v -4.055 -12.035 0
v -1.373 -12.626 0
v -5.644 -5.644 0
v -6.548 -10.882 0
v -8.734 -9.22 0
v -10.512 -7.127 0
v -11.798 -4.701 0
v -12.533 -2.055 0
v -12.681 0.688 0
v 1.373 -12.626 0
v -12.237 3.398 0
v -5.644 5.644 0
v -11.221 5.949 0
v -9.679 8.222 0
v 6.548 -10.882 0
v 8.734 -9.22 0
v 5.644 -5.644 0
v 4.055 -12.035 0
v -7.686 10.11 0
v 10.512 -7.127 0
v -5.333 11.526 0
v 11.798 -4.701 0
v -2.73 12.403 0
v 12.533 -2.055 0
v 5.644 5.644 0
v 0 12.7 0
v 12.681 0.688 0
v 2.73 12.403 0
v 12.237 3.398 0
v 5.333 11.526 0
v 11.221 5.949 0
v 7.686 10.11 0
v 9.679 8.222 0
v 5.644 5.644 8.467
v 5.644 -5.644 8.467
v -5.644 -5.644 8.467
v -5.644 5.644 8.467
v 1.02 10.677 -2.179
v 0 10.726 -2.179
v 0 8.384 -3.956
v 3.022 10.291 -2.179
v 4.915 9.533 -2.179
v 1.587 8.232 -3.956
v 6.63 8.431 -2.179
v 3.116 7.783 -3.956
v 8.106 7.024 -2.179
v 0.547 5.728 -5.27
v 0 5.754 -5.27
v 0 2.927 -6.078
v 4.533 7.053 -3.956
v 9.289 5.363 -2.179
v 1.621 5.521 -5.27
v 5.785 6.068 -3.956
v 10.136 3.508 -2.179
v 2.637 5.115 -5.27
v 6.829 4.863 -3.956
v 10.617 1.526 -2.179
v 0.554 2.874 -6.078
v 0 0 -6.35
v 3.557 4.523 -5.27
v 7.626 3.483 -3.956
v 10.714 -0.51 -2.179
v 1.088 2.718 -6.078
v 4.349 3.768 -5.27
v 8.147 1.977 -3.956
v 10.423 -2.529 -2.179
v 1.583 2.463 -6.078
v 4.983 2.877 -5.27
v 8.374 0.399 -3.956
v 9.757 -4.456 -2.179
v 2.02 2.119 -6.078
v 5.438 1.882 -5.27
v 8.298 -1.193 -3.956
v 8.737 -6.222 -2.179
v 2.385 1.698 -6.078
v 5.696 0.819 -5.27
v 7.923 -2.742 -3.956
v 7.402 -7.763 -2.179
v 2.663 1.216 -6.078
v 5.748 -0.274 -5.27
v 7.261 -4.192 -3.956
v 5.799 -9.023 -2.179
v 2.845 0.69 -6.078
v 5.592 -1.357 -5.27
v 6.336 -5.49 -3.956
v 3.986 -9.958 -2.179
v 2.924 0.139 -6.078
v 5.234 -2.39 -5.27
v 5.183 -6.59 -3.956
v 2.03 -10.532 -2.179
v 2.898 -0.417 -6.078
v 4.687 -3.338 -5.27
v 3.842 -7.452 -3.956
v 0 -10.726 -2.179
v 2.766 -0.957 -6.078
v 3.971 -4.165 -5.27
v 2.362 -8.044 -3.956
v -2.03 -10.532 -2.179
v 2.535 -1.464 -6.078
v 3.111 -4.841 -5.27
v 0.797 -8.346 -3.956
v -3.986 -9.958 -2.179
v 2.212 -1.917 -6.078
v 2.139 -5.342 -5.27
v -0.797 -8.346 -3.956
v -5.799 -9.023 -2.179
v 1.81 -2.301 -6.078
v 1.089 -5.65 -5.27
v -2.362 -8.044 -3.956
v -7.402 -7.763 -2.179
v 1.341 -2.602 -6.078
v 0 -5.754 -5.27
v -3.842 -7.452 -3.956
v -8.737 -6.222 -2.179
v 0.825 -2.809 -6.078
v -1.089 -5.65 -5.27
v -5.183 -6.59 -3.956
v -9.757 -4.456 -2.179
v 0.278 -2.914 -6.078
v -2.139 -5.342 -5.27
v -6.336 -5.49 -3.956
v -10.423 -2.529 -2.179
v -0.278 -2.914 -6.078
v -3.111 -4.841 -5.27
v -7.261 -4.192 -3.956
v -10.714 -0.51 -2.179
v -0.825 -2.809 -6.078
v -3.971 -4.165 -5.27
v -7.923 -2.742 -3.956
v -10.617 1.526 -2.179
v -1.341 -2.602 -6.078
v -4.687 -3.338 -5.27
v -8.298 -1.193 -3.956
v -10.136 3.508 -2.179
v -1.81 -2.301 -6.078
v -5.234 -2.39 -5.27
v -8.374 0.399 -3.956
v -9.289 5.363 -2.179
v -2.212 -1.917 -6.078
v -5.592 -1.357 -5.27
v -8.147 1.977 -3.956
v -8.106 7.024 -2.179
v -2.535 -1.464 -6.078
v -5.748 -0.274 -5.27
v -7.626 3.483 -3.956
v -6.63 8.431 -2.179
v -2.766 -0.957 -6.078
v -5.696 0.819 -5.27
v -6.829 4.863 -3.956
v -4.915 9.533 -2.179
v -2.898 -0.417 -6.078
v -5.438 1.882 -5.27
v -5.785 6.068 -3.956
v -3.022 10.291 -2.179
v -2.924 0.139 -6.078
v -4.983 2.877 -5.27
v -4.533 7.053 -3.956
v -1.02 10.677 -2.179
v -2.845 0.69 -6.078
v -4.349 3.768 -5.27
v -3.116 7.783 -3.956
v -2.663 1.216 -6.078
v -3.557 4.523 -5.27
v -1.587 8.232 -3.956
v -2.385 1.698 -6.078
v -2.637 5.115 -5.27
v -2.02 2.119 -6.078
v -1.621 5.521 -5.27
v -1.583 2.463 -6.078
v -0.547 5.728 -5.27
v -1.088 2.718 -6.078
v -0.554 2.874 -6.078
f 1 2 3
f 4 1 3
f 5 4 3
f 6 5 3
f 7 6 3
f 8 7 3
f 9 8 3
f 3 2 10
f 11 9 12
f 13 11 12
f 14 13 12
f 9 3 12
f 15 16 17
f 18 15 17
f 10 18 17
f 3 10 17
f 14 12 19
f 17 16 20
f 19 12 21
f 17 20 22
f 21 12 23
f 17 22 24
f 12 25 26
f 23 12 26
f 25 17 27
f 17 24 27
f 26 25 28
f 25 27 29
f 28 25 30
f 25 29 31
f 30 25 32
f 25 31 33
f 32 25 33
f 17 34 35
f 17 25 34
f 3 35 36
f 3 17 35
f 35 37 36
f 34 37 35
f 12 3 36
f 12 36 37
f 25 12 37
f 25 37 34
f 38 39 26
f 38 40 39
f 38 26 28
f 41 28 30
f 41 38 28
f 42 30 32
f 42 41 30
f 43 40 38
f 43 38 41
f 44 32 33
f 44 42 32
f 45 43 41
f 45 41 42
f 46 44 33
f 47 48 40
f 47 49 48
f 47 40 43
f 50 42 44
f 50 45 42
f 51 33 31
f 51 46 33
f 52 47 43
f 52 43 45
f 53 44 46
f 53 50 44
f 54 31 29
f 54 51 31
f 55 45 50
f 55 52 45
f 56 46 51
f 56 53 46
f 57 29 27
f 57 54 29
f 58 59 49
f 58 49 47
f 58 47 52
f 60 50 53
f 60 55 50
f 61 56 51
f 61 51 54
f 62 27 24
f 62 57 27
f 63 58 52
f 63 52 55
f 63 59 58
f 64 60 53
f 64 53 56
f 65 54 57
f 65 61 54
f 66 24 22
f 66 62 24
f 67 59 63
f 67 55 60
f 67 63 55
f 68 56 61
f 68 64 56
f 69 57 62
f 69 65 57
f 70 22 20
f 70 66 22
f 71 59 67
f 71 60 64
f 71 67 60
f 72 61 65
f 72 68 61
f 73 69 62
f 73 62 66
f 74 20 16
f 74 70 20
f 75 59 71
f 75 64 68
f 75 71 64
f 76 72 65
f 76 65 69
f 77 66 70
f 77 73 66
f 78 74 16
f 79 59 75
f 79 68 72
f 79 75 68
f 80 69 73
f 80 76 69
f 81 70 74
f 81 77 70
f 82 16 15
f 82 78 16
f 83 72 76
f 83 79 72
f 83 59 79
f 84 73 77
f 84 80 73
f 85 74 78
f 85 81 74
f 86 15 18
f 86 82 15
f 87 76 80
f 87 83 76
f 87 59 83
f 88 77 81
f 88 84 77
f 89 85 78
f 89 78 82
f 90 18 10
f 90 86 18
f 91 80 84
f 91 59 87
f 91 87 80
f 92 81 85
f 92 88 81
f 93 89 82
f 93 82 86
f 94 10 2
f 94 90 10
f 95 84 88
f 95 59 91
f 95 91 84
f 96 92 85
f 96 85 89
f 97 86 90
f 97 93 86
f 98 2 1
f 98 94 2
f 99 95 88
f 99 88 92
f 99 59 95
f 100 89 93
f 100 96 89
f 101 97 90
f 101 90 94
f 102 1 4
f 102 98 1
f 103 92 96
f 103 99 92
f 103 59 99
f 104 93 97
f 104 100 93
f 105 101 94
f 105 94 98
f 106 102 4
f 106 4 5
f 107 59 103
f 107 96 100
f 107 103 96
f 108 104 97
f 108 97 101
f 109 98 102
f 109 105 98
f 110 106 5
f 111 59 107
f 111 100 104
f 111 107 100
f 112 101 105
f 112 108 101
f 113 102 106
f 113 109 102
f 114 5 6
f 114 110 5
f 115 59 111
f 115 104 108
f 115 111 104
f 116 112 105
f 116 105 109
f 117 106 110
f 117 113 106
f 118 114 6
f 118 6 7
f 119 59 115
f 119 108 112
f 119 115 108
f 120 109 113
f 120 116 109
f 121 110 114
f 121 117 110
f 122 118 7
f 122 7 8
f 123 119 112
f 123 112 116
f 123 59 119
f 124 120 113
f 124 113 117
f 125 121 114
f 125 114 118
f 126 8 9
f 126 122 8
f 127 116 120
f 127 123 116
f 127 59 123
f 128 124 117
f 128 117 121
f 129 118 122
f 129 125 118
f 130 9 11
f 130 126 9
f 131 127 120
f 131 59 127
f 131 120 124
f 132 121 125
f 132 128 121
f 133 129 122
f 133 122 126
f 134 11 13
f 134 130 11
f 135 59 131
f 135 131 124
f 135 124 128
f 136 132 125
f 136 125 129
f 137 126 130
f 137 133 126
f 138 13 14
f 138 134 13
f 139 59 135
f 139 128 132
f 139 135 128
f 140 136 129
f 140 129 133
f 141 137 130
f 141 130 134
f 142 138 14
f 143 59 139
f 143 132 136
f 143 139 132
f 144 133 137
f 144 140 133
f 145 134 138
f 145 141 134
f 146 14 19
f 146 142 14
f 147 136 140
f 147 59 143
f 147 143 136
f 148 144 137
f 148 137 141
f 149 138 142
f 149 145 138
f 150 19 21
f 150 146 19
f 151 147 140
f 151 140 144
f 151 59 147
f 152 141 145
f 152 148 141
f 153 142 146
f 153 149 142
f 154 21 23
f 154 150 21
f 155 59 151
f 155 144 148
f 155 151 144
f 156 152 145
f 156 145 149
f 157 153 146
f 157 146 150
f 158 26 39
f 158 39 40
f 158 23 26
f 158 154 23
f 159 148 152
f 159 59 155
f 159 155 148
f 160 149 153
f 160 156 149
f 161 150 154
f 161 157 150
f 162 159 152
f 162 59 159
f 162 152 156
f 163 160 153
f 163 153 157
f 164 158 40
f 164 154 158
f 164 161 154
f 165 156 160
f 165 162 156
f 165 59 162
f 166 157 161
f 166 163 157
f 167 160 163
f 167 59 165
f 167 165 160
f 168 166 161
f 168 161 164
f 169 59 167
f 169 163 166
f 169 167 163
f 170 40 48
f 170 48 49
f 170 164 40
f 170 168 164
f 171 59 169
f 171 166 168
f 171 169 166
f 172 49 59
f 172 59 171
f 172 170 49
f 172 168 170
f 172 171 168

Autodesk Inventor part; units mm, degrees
ref_plane "YZ Plane" through (0, 0, 0) normal (1, 0, 0) x (0, 1, 0)
ref_plane "XZ Plane" through (0, 0, 0) normal (0, 1, 0) x (-1, 0, 0)
ref_plane "XY Plane" through (0, 0, 0) normal (0, 0, 1) x (1, 0, 0)
sketch "Sketch1" plane through (0, 0, 0) normal (0, 0, 1) x (1, 0, 0)
  line L0 (5.6444, -5.6444) -> (-5.6444, -5.6444)
  line L1 (-5.6444, -5.6444) -> (-5.6444, 5.6444)
  line L2 (-5.6444, 5.6444) -> (5.6444, 5.6444)
  line L3 (5.6444, 5.6444) -> (5.6444, -5.6444)
  point P0 (0, 0)
  point P1 (0, 0)
  dimension "d0" = 11.2889
extrude "Extrusion1" add sketch "Sketch1" along normal blind 8.4667
ref_plane "Work Plane1" through (0, 5.6444, 8.4667) normal (-1, 0, 0) x (0, -1, 0)
sketch "Sketch2" plane through (0, 5.6444, 8.4667) normal (-1, 0, 0) x (0, -1, 0)
  line L0 (5.6444, -8.4667) -> (-7.0556, -8.4667)
  line L1 (0, -8.4667) -> (11.2889, -8.4667) projected
  line L2 (5.6444, -8.4667) -> (5.6444, -14.8167)
  arc A0 (-7.0556, -8.4667) -> (5.6444, -14.8167) centre (5.6444, 1.0583) ccw
  dimension "d3" = 12.7
  dimension "d4" = 6.35
revolve "Revolution1" add sketch "Sketch2" angle 360 about axis through (0, 0, 0) along (0, 0, -1)
properties part number "Driver Shaft Cap"
